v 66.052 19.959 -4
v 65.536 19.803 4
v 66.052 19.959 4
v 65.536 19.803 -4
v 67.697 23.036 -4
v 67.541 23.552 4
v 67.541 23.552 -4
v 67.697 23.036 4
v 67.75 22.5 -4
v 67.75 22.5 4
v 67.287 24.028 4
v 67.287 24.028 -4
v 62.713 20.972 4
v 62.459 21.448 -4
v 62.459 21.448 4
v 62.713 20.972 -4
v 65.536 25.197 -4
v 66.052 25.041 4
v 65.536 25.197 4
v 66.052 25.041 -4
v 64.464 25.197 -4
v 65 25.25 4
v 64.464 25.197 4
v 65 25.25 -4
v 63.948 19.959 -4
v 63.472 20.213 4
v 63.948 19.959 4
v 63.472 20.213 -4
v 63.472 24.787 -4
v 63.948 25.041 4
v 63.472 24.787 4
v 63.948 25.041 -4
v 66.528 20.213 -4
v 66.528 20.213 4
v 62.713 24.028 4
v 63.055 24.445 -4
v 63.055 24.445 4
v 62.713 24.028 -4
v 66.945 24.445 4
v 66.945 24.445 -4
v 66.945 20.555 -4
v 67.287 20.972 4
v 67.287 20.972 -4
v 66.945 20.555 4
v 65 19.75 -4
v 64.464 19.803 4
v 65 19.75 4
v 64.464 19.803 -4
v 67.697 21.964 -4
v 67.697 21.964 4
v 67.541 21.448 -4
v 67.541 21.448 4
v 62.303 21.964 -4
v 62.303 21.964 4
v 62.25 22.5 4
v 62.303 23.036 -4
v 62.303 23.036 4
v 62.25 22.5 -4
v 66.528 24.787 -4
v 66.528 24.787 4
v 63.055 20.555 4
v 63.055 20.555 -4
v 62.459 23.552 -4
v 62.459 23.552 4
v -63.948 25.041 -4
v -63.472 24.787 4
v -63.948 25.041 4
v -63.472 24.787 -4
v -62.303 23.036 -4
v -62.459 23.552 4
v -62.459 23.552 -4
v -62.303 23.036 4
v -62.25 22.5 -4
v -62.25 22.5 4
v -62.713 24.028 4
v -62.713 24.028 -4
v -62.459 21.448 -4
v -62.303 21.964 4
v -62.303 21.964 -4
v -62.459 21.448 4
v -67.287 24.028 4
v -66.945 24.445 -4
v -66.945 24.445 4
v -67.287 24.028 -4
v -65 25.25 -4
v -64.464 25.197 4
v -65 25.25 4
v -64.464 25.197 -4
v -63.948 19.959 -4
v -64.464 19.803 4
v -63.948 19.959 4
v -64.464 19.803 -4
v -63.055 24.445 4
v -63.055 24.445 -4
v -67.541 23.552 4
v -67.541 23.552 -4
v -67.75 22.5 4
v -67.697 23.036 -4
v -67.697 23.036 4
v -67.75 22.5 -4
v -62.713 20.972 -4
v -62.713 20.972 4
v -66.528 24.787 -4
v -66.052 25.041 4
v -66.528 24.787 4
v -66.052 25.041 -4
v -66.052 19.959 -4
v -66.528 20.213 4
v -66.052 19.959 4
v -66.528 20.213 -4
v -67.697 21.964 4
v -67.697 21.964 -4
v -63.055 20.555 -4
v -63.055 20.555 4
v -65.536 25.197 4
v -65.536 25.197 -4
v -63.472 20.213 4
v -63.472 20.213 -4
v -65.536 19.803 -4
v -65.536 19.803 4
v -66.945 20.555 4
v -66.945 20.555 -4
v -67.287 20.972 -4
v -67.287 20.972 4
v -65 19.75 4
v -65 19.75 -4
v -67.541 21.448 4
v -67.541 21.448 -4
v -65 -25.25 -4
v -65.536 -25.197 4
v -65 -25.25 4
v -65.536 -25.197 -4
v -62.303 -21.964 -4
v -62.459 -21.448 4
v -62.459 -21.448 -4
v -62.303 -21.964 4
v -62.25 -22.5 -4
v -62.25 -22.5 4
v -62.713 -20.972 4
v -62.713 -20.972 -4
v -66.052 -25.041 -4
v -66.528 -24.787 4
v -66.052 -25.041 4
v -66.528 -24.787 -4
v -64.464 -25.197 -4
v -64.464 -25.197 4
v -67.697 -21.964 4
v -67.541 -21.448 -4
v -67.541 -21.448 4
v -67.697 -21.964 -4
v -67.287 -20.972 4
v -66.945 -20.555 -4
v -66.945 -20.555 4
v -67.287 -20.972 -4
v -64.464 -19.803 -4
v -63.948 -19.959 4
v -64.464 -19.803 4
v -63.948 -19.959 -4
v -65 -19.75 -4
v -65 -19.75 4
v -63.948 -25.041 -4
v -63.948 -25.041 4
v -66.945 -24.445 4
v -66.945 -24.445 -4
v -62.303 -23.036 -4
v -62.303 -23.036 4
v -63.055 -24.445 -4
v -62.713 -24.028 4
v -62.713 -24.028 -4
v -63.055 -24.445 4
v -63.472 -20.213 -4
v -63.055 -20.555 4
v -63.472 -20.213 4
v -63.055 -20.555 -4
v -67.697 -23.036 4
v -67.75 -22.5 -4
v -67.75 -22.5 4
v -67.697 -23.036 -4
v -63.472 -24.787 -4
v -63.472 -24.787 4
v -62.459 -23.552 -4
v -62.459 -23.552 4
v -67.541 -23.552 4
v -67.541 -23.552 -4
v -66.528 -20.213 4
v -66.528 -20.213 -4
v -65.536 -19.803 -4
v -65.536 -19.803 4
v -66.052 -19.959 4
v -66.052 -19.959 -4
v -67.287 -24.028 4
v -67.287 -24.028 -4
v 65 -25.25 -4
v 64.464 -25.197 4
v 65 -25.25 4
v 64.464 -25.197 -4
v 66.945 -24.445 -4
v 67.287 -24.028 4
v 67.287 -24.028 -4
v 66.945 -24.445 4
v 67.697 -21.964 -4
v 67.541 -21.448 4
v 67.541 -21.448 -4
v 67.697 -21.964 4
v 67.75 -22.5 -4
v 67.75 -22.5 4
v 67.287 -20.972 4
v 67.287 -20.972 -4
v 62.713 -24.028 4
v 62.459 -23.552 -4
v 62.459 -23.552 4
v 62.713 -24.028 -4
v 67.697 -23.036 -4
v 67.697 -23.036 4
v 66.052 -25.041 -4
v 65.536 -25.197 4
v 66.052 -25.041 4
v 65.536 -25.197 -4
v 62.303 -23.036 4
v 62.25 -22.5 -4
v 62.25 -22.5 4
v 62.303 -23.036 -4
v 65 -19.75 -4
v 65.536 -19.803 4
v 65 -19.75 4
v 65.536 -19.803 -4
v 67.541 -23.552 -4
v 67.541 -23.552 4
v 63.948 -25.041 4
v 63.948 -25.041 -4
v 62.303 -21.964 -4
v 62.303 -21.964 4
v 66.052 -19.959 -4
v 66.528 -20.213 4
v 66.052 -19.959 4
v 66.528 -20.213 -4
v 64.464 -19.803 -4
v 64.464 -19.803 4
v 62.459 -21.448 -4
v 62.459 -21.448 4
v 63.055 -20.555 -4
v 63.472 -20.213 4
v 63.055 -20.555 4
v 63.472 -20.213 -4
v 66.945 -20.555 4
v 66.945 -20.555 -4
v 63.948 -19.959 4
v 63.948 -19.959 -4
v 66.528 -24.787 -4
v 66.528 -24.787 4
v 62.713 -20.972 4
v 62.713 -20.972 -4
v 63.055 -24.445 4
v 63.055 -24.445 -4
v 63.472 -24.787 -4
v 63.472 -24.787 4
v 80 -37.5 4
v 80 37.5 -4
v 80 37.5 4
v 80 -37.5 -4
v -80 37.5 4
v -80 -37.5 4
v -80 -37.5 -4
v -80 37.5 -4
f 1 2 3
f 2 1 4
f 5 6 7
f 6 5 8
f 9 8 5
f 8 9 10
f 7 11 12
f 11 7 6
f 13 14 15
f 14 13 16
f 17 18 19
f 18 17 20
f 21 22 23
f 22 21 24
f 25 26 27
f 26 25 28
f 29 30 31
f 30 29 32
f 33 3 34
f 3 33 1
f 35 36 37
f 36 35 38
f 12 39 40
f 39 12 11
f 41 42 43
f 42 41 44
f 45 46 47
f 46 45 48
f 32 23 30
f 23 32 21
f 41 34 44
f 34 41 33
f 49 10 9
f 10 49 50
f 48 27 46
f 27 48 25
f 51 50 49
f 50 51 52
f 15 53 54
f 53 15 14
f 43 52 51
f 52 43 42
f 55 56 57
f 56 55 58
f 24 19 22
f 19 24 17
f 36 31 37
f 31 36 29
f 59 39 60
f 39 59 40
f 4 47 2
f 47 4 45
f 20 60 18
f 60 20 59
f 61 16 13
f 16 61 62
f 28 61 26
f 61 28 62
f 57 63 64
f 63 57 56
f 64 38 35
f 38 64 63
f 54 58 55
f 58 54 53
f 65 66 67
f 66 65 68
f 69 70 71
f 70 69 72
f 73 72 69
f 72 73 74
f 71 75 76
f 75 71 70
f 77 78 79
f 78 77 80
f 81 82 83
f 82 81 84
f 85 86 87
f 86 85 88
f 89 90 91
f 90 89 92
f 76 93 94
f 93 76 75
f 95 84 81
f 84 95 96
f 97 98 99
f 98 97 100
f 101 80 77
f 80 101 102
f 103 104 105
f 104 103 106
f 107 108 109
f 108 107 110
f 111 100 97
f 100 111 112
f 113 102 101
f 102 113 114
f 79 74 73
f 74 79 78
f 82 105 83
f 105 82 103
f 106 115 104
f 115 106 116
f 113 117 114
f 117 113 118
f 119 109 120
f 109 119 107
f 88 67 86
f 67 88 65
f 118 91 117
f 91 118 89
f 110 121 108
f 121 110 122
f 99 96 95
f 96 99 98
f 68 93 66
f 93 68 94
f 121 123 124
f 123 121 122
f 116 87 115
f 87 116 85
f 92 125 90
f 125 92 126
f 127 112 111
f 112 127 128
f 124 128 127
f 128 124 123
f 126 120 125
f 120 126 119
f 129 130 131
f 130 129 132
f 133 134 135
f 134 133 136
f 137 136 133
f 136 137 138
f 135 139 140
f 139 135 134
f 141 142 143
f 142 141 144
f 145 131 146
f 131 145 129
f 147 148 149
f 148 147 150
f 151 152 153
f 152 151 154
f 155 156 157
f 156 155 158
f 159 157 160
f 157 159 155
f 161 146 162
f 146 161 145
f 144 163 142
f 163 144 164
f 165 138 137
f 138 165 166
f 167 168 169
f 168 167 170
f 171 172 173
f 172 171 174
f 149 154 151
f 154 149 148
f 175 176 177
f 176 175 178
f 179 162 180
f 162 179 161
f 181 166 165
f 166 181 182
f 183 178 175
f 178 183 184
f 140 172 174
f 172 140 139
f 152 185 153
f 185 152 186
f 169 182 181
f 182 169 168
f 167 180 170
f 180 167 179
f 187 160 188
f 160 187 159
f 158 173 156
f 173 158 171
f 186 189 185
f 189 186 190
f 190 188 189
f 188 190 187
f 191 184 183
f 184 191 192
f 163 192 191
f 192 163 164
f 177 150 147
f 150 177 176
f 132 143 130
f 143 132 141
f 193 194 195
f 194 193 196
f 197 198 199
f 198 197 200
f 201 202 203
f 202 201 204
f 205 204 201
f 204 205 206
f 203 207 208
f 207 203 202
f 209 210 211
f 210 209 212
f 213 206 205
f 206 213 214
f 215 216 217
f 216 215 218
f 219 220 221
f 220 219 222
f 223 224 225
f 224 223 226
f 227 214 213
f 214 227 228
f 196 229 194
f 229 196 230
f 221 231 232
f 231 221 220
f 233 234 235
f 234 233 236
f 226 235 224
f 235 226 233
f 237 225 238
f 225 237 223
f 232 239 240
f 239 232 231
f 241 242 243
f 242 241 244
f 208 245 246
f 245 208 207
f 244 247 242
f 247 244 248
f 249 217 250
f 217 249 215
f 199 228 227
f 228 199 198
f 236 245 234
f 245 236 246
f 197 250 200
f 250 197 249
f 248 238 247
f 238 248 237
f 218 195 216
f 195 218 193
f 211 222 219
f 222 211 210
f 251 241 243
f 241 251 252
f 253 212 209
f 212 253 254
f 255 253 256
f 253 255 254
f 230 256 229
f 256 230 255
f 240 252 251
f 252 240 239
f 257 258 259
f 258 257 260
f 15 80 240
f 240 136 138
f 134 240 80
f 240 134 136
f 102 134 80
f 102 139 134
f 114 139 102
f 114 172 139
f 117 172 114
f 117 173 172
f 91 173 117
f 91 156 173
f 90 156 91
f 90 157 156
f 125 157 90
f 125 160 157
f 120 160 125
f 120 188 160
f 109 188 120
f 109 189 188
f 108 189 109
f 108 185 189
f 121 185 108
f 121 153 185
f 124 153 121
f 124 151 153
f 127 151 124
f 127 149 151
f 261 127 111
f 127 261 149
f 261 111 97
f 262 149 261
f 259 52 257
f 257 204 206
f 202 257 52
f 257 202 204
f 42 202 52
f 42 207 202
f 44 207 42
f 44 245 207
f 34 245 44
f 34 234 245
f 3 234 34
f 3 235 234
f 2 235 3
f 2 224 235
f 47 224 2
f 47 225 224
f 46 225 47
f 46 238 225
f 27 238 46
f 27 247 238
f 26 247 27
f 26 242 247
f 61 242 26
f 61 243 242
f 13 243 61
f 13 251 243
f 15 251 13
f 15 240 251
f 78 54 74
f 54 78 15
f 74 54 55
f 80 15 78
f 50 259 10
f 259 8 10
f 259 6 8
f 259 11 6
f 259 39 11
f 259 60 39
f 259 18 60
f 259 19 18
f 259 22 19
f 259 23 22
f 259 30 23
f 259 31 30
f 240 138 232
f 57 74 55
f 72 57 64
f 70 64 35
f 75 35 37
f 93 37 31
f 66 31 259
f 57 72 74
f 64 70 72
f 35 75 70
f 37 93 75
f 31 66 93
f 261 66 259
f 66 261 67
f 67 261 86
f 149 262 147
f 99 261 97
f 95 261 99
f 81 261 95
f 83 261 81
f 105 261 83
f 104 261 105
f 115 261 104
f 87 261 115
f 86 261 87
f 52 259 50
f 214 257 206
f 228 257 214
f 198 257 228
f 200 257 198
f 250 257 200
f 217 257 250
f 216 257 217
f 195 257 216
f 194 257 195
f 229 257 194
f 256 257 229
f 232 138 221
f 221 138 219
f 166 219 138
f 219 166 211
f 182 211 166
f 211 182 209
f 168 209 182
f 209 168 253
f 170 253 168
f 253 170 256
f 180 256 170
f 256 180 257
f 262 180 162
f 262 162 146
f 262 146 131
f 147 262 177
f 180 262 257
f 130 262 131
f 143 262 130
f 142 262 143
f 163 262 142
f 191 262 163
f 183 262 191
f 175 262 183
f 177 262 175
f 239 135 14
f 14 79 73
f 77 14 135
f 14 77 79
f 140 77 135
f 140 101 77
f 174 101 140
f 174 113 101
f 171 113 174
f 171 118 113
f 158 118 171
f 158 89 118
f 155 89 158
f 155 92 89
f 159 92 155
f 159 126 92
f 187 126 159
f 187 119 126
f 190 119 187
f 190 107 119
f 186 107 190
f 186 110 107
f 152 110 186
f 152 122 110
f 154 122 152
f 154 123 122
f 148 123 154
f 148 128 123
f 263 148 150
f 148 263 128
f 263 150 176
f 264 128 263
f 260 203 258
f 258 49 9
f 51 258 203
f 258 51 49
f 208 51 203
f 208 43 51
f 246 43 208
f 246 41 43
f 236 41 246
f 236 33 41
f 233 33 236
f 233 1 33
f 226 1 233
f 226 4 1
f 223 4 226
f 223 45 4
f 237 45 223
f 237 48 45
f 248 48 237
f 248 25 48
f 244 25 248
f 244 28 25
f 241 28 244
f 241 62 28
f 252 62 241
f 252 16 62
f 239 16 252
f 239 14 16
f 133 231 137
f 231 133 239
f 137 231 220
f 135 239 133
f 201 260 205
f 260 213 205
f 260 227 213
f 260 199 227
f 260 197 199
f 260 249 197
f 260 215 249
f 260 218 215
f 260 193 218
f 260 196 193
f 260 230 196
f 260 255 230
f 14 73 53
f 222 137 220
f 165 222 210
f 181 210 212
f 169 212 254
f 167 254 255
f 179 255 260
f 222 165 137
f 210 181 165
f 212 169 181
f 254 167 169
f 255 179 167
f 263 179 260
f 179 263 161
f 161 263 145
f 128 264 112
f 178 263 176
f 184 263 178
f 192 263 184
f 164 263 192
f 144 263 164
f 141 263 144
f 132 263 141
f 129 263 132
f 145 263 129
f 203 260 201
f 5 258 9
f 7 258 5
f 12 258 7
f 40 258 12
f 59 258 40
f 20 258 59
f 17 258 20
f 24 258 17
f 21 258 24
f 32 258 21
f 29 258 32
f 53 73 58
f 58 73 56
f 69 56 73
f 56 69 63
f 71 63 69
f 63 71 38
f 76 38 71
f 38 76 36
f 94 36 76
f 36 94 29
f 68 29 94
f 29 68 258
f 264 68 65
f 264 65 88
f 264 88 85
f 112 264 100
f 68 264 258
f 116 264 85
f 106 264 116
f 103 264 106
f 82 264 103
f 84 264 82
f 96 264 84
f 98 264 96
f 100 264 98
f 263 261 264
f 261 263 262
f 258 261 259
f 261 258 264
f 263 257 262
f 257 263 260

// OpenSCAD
$fn = 32;

// ----------------------------------------------------------------------
// Corner plate 160 x 75 x 8
// 4 holes, centres taken from the edge offset
// ----------------------------------------------------------------------

// --- parameters (mm) ---
plate = [160, 75, 8];  // overall size (x, y, z)
holes = 4;             // number of holes the drawing asks for
hole_d = 5.5;          // hole diameter
edge = 15;             // hole centre offset from the plate edge

// --- derived feature positions (mm) ---
corner_x = plate[0] / 2 - edge;  // = 65   corner hole X
corner_y = plate[1] / 2 - edge;  // = 22.5   corner hole Y
feature_centers = [
  [corner_x, corner_y],
  [-corner_x, corner_y],
  [-corner_x, -corner_y],
  [corner_x, -corner_y]
];   // hole centres the loop below drills

// plate outline, every hole drilled through with the same cutters
difference() {
  cube(plate, center = true);
  for (centre = feature_centers)
    translate([centre[0], centre[1], 0])
      cylinder(d = hole_d, h = plate[2] + 2, center = true);
}
